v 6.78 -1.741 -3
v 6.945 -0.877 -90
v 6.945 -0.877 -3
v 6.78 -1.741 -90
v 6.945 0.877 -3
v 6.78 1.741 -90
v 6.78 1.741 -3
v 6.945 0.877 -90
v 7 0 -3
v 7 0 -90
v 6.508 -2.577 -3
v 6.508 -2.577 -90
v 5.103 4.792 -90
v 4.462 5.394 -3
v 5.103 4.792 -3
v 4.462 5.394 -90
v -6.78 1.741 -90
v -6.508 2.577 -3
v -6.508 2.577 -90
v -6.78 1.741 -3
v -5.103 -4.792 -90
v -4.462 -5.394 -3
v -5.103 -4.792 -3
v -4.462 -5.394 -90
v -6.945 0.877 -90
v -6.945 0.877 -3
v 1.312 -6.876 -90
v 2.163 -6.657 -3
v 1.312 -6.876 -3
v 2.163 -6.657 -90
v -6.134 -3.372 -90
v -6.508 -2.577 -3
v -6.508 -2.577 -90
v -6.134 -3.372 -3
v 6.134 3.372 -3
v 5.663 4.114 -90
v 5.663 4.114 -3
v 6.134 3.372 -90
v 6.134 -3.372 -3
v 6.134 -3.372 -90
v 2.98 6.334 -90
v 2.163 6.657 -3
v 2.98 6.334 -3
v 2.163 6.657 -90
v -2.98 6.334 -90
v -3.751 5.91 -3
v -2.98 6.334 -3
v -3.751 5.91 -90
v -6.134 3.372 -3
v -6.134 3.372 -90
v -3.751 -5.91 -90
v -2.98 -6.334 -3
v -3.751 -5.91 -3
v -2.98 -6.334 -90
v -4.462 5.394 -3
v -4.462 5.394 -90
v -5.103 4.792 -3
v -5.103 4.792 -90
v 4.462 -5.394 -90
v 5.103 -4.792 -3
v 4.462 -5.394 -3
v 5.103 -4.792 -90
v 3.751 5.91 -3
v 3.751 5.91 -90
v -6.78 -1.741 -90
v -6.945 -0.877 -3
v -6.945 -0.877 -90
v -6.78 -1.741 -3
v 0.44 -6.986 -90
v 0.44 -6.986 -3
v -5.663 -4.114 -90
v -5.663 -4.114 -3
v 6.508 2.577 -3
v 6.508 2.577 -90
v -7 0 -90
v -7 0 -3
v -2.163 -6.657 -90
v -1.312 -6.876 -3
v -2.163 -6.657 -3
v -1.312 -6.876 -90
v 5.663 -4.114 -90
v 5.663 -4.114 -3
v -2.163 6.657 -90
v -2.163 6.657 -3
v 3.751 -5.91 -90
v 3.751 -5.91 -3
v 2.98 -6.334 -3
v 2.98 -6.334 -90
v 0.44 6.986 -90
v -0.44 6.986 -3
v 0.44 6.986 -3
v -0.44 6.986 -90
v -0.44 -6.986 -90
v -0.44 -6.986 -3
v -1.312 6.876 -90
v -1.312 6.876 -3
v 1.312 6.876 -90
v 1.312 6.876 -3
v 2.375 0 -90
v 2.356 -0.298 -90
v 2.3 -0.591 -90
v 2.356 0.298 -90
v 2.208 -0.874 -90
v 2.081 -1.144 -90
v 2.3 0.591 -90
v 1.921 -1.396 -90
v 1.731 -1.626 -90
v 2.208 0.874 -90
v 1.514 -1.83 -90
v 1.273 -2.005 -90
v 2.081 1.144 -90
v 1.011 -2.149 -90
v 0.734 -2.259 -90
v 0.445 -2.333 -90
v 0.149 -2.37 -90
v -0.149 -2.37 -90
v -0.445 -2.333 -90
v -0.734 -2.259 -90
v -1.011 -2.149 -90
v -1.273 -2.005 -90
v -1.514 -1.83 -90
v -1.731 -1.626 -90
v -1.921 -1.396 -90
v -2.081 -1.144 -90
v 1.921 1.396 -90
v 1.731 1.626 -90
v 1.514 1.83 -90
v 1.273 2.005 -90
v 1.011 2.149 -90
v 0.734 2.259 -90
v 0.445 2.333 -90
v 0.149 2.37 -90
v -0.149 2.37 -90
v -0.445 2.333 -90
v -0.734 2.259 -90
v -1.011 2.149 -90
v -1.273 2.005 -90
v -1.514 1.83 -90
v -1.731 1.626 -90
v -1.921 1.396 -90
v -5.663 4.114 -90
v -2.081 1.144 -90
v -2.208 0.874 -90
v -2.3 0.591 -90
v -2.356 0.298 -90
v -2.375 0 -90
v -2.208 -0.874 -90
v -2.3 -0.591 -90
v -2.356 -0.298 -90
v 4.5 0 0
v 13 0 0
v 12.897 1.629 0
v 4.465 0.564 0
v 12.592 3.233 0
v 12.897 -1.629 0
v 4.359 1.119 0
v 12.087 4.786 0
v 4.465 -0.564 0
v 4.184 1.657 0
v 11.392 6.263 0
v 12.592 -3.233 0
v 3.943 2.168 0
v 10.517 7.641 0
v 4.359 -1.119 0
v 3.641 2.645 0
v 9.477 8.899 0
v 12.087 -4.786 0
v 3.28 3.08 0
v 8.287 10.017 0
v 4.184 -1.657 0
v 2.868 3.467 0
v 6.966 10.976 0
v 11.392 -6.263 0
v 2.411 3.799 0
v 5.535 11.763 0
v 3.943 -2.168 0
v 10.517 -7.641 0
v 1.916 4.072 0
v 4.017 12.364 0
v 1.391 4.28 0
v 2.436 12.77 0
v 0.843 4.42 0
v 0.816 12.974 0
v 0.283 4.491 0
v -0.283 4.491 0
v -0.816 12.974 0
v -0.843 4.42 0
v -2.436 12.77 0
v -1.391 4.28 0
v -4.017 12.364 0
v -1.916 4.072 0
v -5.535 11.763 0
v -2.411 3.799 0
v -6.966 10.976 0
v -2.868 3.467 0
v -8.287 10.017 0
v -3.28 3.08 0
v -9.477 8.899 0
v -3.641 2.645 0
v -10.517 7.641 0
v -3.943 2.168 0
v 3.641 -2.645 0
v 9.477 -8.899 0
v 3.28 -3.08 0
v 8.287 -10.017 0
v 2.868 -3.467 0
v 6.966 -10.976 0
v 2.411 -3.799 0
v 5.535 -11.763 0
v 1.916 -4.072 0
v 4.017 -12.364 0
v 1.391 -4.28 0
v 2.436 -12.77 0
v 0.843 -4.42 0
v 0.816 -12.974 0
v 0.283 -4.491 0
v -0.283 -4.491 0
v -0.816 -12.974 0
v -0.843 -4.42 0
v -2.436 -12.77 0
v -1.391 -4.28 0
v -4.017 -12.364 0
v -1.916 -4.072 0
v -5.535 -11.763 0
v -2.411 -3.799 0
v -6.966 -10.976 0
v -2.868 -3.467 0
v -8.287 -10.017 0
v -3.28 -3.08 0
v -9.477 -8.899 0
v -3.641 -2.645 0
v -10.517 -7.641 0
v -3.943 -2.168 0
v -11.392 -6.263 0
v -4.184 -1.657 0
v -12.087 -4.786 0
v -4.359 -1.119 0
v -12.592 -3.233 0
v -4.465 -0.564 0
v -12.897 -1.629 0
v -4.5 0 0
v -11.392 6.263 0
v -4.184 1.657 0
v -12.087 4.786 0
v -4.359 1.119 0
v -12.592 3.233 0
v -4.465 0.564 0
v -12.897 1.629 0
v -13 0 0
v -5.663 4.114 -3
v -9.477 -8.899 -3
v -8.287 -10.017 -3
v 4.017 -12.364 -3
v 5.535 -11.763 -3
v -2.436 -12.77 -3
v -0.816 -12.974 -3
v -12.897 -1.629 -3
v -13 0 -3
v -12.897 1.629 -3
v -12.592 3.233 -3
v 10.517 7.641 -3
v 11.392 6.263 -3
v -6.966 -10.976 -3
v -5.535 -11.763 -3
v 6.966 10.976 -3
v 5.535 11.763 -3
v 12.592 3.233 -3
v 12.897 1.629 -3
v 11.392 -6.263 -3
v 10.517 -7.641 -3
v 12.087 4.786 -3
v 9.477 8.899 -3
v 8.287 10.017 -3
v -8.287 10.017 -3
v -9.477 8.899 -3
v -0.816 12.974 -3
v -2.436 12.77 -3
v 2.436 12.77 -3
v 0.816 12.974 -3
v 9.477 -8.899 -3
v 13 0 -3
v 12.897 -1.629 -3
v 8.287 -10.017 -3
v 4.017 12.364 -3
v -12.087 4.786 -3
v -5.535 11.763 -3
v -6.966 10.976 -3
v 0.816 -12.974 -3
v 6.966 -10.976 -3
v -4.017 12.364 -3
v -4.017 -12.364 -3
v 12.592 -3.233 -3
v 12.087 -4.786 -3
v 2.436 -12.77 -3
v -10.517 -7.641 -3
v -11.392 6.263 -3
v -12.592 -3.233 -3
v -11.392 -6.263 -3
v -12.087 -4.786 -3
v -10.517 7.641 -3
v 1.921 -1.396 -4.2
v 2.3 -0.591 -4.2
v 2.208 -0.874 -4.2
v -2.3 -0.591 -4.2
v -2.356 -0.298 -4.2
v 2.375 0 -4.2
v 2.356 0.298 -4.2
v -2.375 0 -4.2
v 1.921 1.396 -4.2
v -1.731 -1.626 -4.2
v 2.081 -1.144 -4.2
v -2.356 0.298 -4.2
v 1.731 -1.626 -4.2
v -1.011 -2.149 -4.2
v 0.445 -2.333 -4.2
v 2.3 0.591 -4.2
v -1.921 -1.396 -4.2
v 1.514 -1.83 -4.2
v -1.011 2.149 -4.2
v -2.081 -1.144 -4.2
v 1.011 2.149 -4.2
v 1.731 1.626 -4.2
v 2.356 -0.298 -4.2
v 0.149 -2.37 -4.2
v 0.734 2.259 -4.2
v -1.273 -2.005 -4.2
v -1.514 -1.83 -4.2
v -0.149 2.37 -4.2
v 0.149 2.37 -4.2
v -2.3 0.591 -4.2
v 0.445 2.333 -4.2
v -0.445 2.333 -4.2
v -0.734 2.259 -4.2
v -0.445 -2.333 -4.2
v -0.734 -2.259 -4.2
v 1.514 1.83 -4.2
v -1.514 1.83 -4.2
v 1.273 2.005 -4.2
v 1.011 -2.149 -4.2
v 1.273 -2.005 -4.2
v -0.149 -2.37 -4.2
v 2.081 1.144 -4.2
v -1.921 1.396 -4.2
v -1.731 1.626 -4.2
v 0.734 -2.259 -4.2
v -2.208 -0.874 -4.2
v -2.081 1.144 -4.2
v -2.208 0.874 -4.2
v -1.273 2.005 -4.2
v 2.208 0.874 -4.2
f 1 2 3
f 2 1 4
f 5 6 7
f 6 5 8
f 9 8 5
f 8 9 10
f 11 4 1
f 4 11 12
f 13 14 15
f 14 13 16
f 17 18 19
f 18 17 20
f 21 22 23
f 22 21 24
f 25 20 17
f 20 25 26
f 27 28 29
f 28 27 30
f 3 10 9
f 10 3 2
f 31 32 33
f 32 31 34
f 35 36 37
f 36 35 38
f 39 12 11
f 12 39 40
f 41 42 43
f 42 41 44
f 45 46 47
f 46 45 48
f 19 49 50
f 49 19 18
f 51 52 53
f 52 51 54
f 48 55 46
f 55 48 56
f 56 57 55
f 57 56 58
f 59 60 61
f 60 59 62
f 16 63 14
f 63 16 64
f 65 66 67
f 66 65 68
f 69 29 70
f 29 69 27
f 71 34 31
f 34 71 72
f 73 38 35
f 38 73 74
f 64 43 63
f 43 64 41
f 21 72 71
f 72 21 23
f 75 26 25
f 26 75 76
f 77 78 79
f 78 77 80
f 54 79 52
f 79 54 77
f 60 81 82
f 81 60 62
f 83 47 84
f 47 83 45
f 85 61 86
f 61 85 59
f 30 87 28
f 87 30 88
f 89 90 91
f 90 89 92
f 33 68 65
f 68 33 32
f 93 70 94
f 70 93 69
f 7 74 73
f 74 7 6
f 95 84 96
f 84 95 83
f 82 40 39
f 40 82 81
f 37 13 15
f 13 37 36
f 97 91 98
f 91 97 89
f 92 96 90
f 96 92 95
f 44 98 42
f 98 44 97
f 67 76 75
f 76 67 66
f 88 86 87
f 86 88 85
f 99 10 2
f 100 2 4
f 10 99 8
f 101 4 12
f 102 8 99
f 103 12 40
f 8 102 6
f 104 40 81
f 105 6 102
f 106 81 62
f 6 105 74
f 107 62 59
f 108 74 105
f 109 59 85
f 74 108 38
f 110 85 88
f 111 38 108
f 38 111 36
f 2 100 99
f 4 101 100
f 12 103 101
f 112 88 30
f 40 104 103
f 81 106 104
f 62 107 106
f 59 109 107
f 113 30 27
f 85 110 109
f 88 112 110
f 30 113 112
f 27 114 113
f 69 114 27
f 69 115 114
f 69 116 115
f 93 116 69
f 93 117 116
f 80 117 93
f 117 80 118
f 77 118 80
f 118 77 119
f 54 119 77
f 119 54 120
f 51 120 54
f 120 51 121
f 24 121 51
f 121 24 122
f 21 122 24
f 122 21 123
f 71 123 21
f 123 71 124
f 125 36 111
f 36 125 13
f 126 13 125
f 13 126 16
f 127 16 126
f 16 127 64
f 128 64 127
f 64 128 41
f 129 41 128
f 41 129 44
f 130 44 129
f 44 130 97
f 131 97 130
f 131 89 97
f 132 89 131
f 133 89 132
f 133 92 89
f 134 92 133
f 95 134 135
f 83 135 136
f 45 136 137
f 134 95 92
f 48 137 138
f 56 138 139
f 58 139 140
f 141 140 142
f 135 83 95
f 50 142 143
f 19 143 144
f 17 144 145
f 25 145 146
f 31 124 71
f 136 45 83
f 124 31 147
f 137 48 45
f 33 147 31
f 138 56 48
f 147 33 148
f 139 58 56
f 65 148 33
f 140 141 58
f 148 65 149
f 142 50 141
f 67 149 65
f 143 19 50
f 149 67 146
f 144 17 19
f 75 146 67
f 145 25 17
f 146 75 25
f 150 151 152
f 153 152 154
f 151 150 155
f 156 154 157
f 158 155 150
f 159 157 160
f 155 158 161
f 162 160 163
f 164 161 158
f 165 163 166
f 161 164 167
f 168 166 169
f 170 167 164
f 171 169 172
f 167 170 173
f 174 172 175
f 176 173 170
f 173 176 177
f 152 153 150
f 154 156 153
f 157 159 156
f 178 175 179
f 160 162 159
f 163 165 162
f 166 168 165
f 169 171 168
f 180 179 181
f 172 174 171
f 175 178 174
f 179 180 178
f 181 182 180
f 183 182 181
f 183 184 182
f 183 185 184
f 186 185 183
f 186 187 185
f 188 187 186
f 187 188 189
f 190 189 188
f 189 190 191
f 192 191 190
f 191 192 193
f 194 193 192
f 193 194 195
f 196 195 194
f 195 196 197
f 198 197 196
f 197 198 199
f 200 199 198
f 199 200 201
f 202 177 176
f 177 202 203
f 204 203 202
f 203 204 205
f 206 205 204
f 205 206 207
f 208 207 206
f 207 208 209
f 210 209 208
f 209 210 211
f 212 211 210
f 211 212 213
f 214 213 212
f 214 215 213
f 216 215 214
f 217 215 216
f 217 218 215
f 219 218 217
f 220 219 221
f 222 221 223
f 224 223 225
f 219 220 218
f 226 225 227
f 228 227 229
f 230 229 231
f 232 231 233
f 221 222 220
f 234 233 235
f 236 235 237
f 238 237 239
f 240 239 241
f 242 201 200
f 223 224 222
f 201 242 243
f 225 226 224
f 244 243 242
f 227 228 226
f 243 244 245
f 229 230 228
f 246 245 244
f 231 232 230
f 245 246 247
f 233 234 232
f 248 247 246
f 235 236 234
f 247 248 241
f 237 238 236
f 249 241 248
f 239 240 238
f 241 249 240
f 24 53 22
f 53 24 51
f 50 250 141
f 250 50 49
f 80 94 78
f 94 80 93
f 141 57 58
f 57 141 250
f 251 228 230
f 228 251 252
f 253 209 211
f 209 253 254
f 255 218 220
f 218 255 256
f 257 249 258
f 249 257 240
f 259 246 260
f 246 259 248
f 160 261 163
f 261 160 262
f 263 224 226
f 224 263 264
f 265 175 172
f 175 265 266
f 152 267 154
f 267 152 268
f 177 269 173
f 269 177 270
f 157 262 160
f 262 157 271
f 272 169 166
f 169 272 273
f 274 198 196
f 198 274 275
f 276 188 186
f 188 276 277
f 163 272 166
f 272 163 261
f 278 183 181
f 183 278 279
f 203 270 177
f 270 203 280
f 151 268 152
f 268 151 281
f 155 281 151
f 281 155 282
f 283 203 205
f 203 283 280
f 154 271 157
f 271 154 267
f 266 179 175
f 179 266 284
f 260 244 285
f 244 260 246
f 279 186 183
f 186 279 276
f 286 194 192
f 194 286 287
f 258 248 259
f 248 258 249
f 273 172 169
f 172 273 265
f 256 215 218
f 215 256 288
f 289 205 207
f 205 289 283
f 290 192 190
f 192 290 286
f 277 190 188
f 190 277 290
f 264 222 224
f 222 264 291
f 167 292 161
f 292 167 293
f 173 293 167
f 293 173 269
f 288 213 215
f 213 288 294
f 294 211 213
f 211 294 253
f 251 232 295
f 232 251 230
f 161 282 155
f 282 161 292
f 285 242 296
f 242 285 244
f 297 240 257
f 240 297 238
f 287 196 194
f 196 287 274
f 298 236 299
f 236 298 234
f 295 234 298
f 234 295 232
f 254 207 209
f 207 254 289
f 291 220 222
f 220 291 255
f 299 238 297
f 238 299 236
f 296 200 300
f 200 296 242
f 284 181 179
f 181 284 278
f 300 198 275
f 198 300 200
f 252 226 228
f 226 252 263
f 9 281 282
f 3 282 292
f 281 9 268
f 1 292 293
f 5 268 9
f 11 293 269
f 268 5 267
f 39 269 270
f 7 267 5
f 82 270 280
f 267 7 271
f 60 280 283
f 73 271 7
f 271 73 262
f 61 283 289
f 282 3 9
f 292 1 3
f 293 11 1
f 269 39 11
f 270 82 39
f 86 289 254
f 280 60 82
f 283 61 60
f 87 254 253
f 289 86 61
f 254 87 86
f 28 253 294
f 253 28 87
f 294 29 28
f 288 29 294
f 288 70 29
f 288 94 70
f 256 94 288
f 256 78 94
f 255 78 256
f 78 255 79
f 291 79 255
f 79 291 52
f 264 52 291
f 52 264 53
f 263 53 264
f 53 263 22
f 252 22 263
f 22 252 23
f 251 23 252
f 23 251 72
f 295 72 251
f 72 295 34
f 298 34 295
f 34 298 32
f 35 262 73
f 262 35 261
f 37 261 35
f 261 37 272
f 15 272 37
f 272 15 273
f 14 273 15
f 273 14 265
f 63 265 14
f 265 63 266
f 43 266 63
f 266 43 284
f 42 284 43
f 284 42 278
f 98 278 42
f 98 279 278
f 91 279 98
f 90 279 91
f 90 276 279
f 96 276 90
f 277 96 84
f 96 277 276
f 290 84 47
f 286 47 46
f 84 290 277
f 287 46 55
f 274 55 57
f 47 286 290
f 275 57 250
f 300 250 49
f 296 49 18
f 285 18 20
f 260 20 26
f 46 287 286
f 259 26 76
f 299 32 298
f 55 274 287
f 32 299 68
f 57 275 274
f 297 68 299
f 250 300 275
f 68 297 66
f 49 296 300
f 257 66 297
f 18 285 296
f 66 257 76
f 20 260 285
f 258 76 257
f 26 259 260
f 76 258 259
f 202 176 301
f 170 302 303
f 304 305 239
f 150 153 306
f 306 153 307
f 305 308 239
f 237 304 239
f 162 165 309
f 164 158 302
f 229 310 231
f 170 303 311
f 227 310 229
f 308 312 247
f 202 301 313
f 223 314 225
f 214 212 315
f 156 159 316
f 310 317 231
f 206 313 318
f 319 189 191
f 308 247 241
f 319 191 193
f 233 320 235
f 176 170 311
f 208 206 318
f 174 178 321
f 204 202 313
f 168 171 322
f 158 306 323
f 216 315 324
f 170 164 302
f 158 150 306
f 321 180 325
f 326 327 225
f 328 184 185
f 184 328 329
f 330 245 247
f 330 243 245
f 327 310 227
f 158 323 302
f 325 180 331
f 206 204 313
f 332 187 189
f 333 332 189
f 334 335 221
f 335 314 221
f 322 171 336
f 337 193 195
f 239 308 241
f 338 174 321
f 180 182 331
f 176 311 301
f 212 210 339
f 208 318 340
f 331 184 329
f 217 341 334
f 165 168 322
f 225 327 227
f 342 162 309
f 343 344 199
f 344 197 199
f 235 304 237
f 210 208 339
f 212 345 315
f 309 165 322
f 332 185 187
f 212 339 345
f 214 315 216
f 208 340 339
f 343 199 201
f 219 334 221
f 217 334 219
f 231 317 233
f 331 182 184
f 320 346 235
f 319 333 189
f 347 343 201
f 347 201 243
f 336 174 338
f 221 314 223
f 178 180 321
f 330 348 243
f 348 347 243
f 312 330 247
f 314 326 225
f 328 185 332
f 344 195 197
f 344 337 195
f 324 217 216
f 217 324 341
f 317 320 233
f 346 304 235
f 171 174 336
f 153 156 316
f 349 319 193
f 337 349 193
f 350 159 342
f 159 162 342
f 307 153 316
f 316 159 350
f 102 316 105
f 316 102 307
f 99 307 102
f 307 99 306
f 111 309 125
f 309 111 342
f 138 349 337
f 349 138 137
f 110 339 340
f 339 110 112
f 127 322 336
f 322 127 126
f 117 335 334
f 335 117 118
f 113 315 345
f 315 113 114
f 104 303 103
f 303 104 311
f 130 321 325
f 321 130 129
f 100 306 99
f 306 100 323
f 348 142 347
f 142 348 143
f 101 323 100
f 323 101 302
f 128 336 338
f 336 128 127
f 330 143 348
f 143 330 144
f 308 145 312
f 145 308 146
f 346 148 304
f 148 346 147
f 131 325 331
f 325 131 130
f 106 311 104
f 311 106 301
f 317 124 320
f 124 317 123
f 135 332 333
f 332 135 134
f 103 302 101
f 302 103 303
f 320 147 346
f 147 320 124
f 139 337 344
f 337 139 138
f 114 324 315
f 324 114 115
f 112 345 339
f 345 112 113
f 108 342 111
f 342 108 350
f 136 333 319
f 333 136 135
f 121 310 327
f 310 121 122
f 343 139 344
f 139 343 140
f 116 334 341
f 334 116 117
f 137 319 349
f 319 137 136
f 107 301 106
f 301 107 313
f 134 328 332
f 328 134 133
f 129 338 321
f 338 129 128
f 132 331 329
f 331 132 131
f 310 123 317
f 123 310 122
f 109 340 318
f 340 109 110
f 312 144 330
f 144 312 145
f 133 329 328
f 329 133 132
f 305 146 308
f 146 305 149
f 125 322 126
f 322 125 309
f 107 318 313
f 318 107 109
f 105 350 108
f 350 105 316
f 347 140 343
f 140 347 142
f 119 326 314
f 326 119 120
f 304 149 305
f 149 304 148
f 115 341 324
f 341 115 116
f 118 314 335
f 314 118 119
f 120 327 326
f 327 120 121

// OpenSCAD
$fn = 50;


difference() {
	union() {
		translate(v = [0, 0, -90.0000000000]) {
			cylinder(h = 90, r = 7.0000000000);
		}
		translate(v = [0, 0, -3.0000000000]) {
			cylinder(h = 3, r = 13.0000000000);
		}
	}
	union() {
		translate(v = [0, 0, 0]) {
			rotate(a = [0, 0, 0]) {
				difference() {
					union() {
						#translate(v = [0, 0, -90.0000000000]) {
							cylinder(h = 90, r = 2.2500000000);
						}
						#translate(v = [0, 0, -4.2000000000]) {
							cylinder(h = 4.2000000000, r1 = 2.3750000000, r2 = 4.5000000000);
						}
						#translate(v = [0, 0, -90.0000000000]) {
							cylinder(h = 90, r = 2.3750000000);
						}
						#translate(v = [0, 0, -90.0000000000]) {
							cylinder(h = 90, r = 2.2500000000);
						}
					}
					union();
				}
			}
		}
	}
}
